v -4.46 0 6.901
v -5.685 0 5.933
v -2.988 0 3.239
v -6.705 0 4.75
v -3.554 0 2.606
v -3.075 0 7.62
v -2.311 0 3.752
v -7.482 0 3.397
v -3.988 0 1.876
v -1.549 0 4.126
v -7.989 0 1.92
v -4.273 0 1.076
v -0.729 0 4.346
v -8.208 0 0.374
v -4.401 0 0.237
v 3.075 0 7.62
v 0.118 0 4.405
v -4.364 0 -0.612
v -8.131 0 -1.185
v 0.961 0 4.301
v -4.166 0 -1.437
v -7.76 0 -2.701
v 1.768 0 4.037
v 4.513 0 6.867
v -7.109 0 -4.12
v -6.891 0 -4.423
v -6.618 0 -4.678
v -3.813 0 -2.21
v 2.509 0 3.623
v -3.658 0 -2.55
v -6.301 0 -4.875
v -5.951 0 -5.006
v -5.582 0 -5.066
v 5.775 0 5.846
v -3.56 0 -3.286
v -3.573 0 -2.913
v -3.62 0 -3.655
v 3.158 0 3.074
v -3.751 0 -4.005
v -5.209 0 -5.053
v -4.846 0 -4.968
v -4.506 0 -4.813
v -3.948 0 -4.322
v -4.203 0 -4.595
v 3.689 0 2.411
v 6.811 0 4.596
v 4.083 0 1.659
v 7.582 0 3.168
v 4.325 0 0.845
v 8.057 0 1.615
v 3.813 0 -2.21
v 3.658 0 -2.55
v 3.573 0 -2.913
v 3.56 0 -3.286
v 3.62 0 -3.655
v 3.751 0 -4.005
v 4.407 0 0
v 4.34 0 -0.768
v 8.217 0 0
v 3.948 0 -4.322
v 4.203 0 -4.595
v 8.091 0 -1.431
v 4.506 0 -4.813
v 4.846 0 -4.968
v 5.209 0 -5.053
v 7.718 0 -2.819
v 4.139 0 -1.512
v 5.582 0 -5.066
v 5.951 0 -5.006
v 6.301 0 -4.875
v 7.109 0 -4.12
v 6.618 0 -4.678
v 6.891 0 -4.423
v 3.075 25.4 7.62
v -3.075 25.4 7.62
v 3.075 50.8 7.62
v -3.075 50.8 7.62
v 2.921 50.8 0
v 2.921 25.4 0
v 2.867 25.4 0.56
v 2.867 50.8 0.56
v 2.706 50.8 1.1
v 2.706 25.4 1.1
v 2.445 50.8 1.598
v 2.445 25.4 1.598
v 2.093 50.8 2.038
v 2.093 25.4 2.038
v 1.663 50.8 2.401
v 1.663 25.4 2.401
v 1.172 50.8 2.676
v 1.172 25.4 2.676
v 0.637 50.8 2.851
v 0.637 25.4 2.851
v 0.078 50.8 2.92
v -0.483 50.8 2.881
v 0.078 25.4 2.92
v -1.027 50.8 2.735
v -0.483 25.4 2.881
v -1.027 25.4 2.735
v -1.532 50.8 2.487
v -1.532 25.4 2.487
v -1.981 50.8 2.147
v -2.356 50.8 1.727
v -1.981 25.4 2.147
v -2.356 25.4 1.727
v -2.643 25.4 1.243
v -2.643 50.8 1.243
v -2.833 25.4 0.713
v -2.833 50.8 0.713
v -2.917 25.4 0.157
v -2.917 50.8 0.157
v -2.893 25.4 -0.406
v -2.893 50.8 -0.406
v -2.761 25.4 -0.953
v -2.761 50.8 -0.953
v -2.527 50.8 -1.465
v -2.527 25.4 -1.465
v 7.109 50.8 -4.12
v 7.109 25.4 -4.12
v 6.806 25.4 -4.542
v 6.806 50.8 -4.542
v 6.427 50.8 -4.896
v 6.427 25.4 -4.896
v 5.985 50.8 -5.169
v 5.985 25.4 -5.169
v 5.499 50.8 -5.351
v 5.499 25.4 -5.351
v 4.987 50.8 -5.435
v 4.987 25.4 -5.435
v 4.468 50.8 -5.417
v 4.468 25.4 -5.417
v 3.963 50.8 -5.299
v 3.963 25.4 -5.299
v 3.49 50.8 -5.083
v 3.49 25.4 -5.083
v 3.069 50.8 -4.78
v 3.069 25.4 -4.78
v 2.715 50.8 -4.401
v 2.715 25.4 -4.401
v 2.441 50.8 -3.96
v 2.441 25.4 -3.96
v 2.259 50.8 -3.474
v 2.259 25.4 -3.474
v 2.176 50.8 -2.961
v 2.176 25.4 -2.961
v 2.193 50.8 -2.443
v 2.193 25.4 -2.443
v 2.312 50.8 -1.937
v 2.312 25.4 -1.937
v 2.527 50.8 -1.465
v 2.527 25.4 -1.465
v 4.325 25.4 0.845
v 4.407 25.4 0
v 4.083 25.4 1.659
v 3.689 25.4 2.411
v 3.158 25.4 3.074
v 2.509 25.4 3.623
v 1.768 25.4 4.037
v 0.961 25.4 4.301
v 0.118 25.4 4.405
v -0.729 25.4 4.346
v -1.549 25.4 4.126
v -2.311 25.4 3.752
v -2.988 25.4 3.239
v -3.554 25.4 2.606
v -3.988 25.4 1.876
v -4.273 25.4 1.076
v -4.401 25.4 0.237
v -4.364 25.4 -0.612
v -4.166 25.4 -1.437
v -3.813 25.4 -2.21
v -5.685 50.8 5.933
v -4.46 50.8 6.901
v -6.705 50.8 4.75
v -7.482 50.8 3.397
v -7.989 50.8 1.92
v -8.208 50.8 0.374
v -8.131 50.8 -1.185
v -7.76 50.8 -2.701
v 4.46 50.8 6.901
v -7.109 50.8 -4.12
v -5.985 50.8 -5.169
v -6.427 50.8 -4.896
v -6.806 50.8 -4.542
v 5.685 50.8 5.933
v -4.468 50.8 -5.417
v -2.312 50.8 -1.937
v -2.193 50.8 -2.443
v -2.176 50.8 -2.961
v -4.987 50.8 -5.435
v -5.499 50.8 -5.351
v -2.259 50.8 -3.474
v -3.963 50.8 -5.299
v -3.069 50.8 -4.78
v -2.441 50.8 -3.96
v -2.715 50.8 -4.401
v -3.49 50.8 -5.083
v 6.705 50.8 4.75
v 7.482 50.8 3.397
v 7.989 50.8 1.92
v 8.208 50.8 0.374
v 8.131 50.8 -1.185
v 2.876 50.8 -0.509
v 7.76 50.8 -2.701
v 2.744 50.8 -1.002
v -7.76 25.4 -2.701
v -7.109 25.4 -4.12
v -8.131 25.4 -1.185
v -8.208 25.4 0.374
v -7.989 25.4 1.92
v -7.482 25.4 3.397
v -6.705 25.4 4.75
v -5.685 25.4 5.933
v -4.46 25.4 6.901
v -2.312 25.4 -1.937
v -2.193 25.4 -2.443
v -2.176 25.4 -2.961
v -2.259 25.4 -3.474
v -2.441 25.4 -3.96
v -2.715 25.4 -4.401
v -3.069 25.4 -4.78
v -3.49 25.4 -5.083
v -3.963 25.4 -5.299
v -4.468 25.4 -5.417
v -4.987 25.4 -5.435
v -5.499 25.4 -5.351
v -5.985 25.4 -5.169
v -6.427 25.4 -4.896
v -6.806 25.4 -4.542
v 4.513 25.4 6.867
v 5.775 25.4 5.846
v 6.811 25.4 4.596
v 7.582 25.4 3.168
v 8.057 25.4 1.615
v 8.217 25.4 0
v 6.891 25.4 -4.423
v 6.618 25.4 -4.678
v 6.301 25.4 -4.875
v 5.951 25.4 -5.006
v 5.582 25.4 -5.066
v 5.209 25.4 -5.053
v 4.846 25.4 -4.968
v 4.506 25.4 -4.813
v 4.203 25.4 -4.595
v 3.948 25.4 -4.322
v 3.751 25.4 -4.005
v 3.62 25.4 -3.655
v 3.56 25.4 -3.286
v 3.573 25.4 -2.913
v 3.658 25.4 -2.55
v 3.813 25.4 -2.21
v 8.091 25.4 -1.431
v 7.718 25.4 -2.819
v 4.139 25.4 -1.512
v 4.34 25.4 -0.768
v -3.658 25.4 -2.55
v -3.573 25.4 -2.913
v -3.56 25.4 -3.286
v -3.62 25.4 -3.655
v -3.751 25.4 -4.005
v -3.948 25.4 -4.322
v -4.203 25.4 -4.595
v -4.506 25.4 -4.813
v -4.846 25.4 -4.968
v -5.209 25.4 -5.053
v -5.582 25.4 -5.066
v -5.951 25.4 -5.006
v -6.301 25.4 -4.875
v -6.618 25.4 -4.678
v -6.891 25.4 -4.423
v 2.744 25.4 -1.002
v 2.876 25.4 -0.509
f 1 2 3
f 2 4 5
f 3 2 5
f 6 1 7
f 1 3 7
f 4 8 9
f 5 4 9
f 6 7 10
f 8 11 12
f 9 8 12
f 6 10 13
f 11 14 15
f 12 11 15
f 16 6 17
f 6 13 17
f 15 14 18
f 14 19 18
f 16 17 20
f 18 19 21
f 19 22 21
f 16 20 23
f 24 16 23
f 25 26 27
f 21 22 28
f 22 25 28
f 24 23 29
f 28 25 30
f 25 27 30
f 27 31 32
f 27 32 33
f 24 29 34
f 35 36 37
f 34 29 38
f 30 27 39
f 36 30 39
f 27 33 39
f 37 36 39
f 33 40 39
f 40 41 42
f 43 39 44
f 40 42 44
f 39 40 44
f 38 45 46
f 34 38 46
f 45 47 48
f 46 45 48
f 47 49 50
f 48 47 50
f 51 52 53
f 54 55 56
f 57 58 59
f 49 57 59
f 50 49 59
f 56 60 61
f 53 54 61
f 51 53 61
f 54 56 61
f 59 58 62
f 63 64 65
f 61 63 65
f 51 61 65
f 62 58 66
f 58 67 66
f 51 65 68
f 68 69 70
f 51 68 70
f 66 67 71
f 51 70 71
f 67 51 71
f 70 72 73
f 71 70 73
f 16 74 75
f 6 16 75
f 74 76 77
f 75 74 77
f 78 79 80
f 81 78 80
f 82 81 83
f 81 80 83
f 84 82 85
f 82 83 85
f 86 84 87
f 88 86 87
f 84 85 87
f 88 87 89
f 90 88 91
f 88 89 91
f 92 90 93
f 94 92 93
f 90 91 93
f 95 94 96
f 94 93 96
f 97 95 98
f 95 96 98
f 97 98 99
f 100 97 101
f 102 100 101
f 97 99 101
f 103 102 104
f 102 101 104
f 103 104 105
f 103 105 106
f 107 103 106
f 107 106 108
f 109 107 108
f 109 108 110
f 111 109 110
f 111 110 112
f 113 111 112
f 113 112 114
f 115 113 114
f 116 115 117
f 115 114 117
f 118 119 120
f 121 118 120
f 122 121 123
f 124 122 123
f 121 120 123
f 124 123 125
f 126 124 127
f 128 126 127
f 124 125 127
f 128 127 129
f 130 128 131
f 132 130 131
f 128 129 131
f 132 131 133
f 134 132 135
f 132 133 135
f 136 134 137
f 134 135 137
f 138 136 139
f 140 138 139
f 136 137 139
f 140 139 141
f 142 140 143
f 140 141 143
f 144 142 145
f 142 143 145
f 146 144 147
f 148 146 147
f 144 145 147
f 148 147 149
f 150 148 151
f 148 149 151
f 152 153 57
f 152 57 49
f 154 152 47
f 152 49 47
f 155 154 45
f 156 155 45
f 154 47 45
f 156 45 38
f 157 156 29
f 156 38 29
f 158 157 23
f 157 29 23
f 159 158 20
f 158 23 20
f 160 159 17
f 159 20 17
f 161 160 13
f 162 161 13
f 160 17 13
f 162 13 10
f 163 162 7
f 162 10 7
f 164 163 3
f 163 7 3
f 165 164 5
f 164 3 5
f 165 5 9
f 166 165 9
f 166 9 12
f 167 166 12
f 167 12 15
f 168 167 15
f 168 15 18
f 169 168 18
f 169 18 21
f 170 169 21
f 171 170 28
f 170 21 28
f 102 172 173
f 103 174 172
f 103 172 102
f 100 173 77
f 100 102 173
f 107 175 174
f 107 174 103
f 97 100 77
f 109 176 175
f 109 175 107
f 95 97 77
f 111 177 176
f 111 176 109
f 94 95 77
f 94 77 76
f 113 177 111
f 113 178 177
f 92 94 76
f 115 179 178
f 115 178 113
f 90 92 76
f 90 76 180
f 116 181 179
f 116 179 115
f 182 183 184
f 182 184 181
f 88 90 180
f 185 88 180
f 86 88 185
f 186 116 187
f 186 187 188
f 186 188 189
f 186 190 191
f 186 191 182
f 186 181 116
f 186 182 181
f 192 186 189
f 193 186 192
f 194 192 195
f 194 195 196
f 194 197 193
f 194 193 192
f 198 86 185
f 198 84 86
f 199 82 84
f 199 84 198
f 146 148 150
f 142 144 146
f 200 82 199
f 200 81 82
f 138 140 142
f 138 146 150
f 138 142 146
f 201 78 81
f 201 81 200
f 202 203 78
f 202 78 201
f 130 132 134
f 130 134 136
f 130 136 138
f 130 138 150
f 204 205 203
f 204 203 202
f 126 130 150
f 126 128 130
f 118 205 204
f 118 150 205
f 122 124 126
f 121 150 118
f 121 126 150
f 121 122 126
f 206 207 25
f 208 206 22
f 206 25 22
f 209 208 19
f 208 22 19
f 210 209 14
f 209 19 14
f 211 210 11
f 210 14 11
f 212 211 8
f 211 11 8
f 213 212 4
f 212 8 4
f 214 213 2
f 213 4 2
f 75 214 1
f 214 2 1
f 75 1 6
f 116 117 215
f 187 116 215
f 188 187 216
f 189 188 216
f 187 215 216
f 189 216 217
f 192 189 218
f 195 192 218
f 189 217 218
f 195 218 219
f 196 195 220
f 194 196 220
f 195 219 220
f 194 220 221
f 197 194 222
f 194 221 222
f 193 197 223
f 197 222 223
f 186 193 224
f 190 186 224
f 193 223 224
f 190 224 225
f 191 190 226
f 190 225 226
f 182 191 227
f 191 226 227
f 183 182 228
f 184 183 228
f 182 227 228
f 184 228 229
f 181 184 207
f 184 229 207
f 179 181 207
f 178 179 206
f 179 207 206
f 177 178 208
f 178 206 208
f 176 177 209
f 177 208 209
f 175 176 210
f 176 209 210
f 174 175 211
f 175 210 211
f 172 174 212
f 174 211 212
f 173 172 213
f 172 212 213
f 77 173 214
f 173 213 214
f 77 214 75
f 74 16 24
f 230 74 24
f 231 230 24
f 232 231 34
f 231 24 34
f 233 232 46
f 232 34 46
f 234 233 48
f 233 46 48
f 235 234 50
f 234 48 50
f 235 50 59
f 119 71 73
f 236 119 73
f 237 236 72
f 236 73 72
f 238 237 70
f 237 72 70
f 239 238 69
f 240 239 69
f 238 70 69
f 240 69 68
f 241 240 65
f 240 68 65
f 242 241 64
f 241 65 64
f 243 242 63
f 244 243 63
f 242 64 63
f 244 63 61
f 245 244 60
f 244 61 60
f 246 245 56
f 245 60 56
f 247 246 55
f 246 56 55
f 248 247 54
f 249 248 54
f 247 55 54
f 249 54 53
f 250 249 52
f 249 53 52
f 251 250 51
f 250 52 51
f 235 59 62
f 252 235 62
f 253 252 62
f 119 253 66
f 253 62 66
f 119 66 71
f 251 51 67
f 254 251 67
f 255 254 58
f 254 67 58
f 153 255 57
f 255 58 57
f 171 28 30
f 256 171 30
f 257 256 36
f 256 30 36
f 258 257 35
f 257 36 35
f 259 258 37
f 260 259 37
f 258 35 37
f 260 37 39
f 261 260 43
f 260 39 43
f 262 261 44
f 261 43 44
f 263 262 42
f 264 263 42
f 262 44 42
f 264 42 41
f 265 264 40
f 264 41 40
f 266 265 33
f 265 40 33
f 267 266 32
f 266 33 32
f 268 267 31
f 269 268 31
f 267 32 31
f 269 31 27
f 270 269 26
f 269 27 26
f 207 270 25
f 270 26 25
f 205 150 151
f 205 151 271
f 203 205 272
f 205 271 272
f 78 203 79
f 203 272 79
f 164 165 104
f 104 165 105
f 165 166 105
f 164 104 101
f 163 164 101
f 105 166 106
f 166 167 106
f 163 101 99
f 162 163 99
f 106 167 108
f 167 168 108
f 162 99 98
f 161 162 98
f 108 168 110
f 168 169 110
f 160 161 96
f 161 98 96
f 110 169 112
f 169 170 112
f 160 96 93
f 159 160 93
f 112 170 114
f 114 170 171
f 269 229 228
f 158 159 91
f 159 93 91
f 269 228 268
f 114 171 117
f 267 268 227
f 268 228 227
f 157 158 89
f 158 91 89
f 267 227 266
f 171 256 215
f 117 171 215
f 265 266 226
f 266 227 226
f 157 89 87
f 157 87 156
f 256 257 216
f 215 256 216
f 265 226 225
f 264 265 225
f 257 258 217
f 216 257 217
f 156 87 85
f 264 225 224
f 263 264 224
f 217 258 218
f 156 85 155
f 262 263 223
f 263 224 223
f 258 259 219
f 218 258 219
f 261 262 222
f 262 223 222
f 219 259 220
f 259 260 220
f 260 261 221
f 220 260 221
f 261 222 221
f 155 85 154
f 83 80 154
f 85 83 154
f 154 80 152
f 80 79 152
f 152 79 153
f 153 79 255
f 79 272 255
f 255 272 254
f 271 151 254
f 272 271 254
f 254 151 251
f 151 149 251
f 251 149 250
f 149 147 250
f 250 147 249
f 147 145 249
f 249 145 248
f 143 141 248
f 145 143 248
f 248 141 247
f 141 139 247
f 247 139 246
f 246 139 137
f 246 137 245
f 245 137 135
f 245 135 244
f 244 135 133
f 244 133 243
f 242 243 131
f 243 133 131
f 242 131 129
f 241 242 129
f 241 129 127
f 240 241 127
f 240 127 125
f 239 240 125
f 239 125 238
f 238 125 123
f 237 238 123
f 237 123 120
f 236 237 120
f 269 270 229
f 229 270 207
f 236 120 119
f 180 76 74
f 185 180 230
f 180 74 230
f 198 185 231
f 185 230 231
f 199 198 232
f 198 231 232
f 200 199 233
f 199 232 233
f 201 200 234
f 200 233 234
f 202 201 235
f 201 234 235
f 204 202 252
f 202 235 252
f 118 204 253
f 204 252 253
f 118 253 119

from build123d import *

# Parameters (mm, degrees)
BOSS_EXTRUDE1_DEPTH = 25.4
BOSS_EXTRUDE2_DEPTH = 25.4
CUT_EXTRUDE1_DEPTH  = 51.8


with BuildPart() as part:
    # Sketch1 → Boss-Extrude1 (new body)
    with BuildSketch(Plane(origin=(0, 0, 0), x_dir=(1, 0, 0), z_dir=(0, 1, 0))):
        with BuildLine():
            ThreePointArc((3.812810865, 2.209805629), (4.255786873, 1.144135352), (4.4069, 0))
            ThreePointArc((4.4069, 0), (-1.144135352, -4.255786873), (-3.812810865, 2.209805629))
            ThreePointArc((-3.812810865, 2.209805629), (-4.50575261, 4.813242153), (-7.109189135, 4.120300408))
            ThreePointArc((-7.109189135, 4.120300408), (-2.133301363, -7.935141518), (8.2169, 0))
            ThreePointArc((8.2169, 0), (7.935141518, 2.133301363), (7.109189135, 4.120300408))
            ThreePointArc((7.109189135, 4.120300408), (4.50575261, 4.813242153), (3.812810865, 2.209805629))
        make_face()
    extrude(amount=BOSS_EXTRUDE1_DEPTH)

    # Sketch2 → Boss-Extrude2 (add)
    with BuildSketch(Plane(origin=(0, 25.4, 0), x_dir=(1, 0, 0), z_dir=(0, 1, 0))):
        with BuildLine():
            ThreePointArc((-7.109189135, 4.120300408), (0, -8.2169), (7.109189135, 4.120300408))
            ThreePointArc((7.109189135, 4.120300408), (4.50575261, 4.813242153), (3.812810865, 2.209805629))
            ThreePointArc((3.812810865, 2.209805629), (0, -4.4069), (-3.812810865, 2.209805629))
            ThreePointArc((-3.812810865, 2.209805629), (-4.50575261, 4.813242153), (-7.109189135, 4.120300408))
        make_face()
        with BuildLine():
            ThreePointArc((2.52722334, 1.464712665), (2.820838561, 0.758360608), (2.921, 0))
            ThreePointArc((2.921, 0), (-0.758360608, -2.820838561), (-2.52722334, 1.464712665))
            ThreePointArc((-2.52722334, 1.464712665), (-3.490412365, 5.083489434), (-7.109189135, 4.120300408))
            ThreePointArc((-7.109189135, 4.120300408), (-4.50575261, 4.813242153), (-3.812810865, 2.209805629))
            ThreePointArc((-3.812810865, 2.209805629), (0, -4.4069), (3.812810865, 2.209805629))
            ThreePointArc((3.812810865, 2.209805629), (4.50575261, 4.813242153), (7.109189135, 4.120300408))
            ThreePointArc((7.109189135, 4.120300408), (3.490412365, 5.083489434), (2.52722334, 1.464712665))
        make_face()
    extrude(amount=BOSS_EXTRUDE2_DEPTH)

    # Sketch3 → Cut-Extrude1 (cut, through all)
    with BuildSketch(Plane(origin=(0, 50.8, 0), x_dir=(1, 0, 0), z_dir=(0, 1, 0))):
        with BuildLine():
            Line((3.074580558, -7.62), (-3.074580558, -7.62))
            ThreePointArc((-3.074580558, -7.62), (0, -8.2169), (3.074580558, -7.62))
        make_face()
    extrude(amount=-CUT_EXTRUDE1_DEPTH, mode=Mode.SUBTRACT)


solid = part.part
